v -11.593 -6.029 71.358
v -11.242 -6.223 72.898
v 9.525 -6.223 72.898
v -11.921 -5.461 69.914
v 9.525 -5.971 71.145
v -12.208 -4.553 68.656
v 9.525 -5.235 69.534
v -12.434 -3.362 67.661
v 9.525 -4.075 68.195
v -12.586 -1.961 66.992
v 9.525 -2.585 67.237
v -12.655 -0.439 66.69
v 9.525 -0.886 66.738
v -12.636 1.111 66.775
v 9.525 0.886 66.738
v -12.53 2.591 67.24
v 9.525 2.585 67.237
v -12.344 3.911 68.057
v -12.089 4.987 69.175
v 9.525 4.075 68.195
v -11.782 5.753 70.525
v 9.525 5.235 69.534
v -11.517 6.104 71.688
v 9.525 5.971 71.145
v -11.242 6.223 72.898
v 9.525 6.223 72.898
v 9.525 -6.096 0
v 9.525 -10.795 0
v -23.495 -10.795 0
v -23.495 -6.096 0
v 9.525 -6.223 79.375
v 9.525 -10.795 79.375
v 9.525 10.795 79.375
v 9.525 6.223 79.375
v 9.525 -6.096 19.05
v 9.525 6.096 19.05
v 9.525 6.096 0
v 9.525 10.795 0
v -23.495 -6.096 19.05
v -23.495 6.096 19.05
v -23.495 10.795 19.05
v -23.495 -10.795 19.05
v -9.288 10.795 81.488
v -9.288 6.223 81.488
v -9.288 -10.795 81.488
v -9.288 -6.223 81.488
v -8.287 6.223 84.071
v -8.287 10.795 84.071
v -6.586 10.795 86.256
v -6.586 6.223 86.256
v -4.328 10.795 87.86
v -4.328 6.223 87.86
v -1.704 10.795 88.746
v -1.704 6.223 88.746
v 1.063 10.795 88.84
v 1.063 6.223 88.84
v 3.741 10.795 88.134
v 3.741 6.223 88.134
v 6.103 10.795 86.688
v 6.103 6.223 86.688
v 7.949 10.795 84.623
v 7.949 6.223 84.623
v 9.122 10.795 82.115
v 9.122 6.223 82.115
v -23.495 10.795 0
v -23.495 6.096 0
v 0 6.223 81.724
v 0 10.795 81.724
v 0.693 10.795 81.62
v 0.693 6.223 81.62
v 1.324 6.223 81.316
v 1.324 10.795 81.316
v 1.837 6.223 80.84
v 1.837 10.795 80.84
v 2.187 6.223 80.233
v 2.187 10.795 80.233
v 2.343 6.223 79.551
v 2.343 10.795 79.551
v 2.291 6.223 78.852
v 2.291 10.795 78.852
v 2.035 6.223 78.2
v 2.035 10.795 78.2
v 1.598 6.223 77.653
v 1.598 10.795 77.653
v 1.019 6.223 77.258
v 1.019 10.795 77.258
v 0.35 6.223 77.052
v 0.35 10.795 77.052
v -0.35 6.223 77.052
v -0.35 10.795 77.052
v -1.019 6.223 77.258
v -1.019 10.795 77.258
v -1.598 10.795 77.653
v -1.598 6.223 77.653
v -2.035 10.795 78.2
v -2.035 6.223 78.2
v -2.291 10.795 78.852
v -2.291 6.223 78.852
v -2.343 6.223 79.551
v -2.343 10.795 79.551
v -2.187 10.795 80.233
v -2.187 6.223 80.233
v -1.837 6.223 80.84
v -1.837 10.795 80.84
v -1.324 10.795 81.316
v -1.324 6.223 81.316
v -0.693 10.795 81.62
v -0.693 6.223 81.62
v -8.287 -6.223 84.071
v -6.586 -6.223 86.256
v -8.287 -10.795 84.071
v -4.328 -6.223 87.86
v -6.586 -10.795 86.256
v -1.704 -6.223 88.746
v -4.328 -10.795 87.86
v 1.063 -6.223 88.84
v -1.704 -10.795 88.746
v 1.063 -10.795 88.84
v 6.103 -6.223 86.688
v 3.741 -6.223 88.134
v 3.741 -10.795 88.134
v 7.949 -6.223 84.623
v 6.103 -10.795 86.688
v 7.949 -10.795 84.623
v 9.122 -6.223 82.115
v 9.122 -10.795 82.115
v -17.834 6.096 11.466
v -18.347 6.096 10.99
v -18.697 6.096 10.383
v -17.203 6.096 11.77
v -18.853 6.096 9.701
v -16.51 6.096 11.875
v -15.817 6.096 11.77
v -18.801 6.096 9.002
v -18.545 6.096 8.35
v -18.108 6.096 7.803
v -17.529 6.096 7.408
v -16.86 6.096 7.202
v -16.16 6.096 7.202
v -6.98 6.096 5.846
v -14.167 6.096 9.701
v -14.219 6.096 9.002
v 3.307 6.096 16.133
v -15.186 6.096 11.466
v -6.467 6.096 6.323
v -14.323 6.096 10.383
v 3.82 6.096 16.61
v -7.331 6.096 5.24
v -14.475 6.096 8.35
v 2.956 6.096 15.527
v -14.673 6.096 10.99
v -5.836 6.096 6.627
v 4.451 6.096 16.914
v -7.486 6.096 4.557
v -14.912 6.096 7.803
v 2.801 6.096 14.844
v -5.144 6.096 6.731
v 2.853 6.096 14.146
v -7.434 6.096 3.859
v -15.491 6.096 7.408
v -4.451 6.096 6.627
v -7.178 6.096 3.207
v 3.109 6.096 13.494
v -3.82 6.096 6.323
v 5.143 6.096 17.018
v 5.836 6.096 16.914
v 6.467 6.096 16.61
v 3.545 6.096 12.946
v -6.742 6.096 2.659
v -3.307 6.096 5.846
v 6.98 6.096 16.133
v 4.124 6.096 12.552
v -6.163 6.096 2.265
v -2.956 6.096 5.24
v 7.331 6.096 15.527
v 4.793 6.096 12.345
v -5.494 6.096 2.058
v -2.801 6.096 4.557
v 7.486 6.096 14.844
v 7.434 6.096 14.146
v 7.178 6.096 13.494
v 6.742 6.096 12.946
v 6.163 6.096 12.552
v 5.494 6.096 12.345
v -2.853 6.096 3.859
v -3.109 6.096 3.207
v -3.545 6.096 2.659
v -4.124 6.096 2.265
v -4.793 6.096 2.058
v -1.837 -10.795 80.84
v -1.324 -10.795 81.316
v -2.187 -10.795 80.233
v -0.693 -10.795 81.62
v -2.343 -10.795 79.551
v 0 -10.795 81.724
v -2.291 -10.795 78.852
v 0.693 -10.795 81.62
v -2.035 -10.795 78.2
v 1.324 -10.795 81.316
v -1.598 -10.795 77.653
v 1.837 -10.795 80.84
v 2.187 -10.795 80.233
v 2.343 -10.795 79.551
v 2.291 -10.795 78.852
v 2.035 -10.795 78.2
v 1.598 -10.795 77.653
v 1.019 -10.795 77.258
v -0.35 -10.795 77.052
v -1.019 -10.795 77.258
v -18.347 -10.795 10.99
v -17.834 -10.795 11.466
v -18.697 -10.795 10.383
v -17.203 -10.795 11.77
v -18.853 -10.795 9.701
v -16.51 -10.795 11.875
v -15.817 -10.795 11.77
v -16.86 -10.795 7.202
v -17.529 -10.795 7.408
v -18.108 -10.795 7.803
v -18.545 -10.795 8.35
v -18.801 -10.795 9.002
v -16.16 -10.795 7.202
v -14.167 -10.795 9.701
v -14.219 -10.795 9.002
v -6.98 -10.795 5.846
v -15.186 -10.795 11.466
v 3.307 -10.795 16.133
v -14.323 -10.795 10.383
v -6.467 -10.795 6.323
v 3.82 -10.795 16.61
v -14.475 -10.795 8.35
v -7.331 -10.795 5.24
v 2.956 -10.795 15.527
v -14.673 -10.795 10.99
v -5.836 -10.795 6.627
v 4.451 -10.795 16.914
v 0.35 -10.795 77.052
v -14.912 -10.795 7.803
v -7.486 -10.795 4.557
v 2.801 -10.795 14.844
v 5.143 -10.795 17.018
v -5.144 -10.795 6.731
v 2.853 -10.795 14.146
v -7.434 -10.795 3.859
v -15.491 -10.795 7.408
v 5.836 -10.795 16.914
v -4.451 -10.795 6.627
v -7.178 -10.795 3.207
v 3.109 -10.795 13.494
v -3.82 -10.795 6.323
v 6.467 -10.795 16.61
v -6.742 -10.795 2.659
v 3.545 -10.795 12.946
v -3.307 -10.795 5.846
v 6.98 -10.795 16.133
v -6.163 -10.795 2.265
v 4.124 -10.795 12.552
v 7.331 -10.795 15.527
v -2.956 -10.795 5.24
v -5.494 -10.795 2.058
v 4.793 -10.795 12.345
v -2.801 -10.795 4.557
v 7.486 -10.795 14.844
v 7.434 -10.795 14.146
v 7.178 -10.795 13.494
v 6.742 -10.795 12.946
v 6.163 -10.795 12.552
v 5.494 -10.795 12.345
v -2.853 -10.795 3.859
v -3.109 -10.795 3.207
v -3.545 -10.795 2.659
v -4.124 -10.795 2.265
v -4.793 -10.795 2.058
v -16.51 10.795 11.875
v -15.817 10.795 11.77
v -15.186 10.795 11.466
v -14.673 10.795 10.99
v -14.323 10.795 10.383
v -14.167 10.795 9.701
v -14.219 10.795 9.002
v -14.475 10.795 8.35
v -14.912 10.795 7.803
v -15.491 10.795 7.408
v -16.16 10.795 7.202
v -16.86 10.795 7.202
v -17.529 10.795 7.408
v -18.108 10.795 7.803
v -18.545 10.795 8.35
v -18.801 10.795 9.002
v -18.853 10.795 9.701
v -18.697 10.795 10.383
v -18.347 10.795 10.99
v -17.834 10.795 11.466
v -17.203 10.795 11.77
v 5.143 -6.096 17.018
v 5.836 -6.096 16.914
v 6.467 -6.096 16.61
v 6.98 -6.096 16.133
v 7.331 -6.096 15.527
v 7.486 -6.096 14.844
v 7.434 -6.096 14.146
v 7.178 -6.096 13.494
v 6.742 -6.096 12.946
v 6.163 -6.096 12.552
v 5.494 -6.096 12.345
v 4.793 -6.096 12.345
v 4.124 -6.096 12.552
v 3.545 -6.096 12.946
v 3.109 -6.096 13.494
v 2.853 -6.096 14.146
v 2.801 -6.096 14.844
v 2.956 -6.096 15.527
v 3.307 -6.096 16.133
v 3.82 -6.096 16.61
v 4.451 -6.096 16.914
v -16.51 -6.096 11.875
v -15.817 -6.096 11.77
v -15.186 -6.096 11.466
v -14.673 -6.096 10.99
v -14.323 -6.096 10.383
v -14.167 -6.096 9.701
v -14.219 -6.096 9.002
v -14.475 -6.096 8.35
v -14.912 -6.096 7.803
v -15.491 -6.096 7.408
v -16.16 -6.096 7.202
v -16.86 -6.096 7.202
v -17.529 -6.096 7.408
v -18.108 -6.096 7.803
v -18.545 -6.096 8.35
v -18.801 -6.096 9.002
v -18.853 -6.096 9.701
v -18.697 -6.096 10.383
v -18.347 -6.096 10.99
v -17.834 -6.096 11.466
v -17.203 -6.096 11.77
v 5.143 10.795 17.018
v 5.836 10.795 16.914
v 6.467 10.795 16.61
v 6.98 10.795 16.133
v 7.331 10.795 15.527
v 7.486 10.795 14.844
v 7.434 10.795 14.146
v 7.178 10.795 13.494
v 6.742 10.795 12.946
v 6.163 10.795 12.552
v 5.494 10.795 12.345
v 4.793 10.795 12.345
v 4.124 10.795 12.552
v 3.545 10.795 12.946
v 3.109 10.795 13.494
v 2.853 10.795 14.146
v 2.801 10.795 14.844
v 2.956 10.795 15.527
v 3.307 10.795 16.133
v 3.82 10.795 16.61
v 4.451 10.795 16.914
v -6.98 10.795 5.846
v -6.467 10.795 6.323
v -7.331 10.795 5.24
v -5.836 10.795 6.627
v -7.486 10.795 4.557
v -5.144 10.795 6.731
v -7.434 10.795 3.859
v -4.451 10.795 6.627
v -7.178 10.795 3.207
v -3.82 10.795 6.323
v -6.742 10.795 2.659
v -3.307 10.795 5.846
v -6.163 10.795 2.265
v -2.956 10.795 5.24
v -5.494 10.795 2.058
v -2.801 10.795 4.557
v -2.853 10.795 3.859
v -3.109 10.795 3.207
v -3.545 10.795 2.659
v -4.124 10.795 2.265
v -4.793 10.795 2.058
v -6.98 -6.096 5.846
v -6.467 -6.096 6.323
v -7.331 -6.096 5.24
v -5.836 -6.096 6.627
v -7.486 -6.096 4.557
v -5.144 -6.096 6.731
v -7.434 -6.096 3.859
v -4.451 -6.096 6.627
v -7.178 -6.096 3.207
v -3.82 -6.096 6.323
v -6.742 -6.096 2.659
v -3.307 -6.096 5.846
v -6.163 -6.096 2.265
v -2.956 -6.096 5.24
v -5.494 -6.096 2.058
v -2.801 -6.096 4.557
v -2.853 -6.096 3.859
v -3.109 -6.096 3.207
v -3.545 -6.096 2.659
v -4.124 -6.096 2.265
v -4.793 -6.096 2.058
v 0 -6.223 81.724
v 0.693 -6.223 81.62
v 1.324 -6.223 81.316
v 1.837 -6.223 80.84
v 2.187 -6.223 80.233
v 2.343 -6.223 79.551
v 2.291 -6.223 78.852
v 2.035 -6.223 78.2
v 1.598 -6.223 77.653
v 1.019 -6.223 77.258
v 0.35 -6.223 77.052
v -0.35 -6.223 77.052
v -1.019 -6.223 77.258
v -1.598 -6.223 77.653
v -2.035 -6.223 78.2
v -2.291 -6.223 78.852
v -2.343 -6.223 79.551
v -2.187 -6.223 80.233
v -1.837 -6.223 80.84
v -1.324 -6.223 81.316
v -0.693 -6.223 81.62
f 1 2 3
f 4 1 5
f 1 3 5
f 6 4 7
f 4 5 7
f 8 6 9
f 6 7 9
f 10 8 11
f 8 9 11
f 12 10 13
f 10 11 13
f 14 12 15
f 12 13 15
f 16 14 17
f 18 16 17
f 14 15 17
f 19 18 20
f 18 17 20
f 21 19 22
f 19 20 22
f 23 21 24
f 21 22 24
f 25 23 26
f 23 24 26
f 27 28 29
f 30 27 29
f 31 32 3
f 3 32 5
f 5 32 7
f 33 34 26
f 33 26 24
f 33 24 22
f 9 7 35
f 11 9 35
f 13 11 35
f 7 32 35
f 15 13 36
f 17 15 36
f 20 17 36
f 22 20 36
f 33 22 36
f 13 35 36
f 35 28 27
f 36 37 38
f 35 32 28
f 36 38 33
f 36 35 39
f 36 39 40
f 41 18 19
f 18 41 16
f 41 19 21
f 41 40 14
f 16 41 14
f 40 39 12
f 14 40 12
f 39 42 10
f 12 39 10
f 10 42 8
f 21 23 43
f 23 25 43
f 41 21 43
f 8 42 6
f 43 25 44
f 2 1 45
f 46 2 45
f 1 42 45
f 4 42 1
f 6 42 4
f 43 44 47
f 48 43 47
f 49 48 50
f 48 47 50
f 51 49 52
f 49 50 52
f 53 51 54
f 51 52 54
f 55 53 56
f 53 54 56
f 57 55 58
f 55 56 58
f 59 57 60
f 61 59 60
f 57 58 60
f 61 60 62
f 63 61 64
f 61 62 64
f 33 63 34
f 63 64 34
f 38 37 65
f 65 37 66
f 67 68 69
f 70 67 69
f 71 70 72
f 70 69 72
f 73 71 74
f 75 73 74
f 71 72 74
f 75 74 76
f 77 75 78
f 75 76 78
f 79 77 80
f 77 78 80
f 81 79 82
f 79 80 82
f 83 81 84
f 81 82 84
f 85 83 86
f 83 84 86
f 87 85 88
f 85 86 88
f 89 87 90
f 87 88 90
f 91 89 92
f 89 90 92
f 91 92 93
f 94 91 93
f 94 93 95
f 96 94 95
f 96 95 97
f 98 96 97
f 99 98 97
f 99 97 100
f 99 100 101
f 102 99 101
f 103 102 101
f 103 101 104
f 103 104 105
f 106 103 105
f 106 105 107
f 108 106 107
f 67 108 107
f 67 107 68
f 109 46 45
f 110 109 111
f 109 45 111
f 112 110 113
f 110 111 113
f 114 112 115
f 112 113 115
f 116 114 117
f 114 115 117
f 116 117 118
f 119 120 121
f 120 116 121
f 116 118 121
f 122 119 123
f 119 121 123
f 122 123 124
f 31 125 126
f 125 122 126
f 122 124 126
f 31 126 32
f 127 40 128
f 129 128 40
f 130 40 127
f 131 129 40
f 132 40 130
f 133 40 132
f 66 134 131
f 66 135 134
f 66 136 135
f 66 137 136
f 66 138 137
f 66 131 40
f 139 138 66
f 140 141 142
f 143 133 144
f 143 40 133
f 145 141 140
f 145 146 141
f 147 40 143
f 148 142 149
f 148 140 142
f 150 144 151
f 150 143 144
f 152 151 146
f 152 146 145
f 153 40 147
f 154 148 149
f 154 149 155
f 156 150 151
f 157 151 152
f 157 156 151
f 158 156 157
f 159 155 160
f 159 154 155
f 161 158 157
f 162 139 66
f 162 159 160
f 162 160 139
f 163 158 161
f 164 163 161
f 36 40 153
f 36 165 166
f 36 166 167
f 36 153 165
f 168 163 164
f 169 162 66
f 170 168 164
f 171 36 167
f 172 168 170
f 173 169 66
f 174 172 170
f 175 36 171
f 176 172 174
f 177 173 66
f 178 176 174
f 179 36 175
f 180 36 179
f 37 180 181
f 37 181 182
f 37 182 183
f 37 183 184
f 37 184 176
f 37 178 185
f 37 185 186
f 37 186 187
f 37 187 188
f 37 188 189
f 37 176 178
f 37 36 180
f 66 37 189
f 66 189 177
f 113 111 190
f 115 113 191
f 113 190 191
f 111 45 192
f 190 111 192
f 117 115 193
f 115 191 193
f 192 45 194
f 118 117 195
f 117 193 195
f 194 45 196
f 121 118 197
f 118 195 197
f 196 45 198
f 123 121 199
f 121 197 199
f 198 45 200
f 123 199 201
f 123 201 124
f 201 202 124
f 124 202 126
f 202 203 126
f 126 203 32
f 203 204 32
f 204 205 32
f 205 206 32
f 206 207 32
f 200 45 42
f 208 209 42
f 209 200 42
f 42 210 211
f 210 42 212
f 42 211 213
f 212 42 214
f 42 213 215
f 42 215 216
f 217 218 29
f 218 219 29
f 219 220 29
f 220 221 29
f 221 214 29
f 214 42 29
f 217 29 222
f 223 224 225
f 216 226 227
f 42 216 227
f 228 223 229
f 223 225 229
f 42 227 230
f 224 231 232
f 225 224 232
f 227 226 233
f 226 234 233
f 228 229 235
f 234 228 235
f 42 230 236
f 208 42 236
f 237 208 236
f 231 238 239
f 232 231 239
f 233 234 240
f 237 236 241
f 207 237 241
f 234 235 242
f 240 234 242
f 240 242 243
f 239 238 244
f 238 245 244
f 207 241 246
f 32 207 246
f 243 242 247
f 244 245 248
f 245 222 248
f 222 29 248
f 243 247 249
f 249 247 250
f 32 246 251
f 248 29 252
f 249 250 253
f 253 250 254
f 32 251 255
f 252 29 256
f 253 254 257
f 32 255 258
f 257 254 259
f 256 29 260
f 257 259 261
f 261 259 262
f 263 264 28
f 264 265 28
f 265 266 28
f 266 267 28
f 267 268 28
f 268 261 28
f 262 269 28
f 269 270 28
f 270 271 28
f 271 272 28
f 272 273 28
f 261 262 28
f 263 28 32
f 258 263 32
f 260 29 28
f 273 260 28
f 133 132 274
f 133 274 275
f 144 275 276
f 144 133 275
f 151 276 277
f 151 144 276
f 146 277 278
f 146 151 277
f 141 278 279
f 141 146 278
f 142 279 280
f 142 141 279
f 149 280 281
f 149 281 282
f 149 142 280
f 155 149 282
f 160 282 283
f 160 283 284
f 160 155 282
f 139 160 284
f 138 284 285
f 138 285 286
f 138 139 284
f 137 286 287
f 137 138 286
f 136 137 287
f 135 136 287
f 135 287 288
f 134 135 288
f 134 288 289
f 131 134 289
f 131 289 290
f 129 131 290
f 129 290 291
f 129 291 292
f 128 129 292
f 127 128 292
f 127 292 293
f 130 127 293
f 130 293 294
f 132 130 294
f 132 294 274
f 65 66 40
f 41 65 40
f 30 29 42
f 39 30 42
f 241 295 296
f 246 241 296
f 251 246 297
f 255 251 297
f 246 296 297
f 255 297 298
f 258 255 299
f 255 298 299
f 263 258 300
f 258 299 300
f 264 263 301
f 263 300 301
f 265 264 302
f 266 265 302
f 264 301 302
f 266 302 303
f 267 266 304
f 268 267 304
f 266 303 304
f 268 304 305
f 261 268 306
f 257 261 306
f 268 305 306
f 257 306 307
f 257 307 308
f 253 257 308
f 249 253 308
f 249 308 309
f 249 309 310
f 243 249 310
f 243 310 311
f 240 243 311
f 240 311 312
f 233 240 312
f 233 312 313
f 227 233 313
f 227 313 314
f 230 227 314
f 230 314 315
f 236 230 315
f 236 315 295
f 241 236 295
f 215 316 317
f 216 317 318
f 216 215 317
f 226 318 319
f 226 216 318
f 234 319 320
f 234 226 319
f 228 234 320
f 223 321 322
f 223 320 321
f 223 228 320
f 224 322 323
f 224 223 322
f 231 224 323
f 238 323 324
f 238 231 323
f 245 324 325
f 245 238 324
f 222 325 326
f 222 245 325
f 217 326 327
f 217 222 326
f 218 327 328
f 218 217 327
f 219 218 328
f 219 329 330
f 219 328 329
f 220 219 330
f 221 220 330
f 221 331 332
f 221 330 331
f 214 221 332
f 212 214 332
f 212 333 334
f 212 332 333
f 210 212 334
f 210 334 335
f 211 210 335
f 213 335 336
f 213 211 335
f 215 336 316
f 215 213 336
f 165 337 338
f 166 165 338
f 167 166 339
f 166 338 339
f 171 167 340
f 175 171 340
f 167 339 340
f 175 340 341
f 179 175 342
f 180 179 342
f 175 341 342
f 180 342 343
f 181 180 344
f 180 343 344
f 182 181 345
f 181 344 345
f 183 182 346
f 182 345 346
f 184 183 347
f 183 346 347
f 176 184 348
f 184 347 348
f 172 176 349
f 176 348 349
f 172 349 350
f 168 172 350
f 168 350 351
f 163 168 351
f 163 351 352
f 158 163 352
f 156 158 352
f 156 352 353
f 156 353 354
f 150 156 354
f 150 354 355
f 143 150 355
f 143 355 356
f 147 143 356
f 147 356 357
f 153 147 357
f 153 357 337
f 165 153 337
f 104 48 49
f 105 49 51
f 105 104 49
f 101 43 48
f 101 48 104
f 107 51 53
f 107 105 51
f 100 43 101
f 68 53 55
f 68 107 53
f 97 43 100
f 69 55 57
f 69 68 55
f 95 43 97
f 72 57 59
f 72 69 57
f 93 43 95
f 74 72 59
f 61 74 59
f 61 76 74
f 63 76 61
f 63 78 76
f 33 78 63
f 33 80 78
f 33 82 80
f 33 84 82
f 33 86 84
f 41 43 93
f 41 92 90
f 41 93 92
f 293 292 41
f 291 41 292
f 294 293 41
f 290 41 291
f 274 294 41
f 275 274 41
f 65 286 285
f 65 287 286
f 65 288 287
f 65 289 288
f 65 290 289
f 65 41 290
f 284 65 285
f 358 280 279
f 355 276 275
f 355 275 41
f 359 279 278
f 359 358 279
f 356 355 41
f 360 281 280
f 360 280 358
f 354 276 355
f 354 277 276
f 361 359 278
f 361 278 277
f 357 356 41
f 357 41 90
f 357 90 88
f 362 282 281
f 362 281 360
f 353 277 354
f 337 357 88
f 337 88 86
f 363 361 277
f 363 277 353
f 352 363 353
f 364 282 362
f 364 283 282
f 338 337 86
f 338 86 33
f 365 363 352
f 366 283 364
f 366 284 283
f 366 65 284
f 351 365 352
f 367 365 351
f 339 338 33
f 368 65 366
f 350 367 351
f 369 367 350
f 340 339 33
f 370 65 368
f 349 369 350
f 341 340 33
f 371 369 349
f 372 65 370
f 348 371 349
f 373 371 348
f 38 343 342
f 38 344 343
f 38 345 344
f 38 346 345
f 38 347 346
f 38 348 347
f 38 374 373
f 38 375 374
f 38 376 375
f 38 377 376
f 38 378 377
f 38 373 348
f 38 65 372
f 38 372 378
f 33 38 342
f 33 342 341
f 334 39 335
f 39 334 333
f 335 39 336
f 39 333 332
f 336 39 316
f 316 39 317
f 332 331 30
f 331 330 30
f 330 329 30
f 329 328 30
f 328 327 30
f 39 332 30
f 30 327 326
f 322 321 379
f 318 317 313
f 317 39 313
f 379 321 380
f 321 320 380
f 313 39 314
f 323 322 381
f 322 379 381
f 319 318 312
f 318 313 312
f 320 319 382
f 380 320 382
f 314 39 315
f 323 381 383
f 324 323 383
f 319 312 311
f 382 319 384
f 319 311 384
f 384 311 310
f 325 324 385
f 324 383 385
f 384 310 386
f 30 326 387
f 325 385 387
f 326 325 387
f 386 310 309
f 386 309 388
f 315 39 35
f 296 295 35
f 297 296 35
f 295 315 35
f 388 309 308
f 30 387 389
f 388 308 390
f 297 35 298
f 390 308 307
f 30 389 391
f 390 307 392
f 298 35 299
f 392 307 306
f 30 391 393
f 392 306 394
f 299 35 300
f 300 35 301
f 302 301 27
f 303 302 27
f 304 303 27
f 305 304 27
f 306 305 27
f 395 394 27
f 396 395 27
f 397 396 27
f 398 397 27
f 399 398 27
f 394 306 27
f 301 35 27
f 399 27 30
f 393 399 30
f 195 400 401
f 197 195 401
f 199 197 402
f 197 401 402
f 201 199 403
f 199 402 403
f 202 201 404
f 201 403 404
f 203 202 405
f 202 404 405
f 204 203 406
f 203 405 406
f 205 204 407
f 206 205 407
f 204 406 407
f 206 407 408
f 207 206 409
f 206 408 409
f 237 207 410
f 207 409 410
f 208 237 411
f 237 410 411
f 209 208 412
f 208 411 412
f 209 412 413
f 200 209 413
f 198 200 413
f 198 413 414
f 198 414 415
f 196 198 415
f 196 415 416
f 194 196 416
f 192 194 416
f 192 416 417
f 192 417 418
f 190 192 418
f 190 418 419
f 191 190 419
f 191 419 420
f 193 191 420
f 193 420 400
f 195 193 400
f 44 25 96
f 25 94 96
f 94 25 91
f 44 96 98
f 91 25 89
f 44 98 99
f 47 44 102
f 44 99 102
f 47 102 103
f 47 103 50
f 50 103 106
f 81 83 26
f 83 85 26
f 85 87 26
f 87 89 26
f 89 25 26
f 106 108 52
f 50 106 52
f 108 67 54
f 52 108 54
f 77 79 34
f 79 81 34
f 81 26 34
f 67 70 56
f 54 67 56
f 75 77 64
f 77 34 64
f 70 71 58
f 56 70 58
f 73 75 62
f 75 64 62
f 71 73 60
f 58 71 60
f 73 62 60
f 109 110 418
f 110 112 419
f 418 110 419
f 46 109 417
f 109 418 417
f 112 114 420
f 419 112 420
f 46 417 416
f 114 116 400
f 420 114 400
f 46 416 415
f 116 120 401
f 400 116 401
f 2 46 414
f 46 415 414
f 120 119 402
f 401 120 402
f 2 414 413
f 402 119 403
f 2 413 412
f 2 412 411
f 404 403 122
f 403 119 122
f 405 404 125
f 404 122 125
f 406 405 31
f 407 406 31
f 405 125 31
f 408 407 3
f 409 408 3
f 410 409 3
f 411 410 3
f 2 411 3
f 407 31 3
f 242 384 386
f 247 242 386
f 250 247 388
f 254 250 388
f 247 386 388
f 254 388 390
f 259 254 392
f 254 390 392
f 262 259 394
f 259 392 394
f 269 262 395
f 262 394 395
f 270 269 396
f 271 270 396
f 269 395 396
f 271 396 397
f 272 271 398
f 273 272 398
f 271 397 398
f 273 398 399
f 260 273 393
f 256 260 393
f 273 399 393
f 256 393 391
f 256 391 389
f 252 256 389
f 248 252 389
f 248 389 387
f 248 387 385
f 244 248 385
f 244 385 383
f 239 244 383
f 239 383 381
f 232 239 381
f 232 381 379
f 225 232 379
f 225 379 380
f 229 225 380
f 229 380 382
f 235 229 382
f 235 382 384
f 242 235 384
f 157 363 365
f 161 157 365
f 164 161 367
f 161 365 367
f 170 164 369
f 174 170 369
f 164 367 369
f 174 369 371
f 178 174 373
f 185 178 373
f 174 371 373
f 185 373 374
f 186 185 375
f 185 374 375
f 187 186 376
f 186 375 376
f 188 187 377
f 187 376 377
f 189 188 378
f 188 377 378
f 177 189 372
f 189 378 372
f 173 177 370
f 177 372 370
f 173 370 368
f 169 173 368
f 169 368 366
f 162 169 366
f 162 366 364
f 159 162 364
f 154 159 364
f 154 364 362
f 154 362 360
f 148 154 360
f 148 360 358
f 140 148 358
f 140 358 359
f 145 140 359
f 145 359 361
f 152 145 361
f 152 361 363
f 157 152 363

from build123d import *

# Parameters (mm, degrees)
SKETCH1_W                    = 19.05
SKETCH1_H                    = 21.59
BOSS_EXTRUDE1_DEPTH          = 88.9
CUT_EXTRUDE_THIN1_DEPTH      = 92.978604713
CUT_EXTRUDE_THIN1_DEPTH_BACK = 88.9
SKETCH4_R                    = 2.3495
CUT_EXTRUDE1_DEPTH           = 92.978604713
BOSS_EXTRUDE2_START          = -21.59
SKETCH5_R                    = 2.3495
BOSS_EXTRUDE2_DEPTH          = 21.59
SKETCH6_W                    = 38.1
SKETCH6_H                    = 12.192
CUT_EXTRUDE2_DEPTH           = 96.446647008


with BuildPart() as part:
    # Sketch1 → Boss-Extrude1 (new body)
    with BuildSketch(Plane.XY):
        Rectangle(SKETCH1_W, SKETCH1_H)
    extrude(amount=BOSS_EXTRUDE1_DEPTH)

    # Sketch3 → Cut-Extrude-Thin1 (cut, two sides: drawn at the far end of the back side and taken through both)
    with BuildSketch(Plane(origin=(0, 10.795, 0), x_dir=(1, 0, 0), z_dir=(0, 1, 0)).offset(-CUT_EXTRUDE_THIN1_DEPTH_BACK)):
        with BuildLine():
            ThreePointArc((-9.525, -79.375), (0, -88.9), (9.525, -79.375))
            Line((9.525, -79.375), (34.925, -79.375))
            ThreePointArc((34.925, -79.375), (0, -114.3), (-34.925, -79.375))
            Line((-34.925, -79.375), (-9.525, -79.375))
        make_face()
    extrude(amount=CUT_EXTRUDE_THIN1_DEPTH + CUT_EXTRUDE_THIN1_DEPTH_BACK, mode=Mode.SUBTRACT)

    # Sketch4 → Cut-Extrude1 (cut, through all)
    with BuildSketch(Plane(origin=(0, 10.795, 0), x_dir=(1, 0, 0), z_dir=(0, 1, 0))):
        with Locations(Location((0, -79.375, 0), (0, 0, 270))):
            Circle(SKETCH4_R)
        with Locations(Location((5.1435, -14.6685, 0), (0, 0, 270))):
            Circle(SKETCH4_R)
        with Locations(Location((-5.1435, -4.3815, 0), (0, 0, 270))):
            Circle(SKETCH4_R)
    extrude(amount=-CUT_EXTRUDE1_DEPTH, mode=Mode.SUBTRACT)

    # Sketch5 → Boss-Extrude2 (add)
    with BuildSketch(Plane(origin=(0, 10.795, 0), x_dir=(1, 0, 0), z_dir=(0, 1, 0)).offset(BOSS_EXTRUDE2_START)):
        with BuildLine():
            Line((-9.525, -79.375), (-9.525, 0))
            Line((-9.525, 0), (-23.495, 0))
            Line((-23.495, 0), (-23.495, -19.05))
            Line((-23.495, -19.05), (-9.287597736, -81.488327539))
            ThreePointArc((-9.287597736, -81.488327539), (-9.465463365, -80.438310059), (-9.525, -79.375))
        make_face()
        with Locations(Location((-16.51, -9.525, 0), (0, 0, 270))):
            Circle(SKETCH5_R, mode=Mode.SUBTRACT)
    extrude(amount=BOSS_EXTRUDE2_DEPTH)

    # Sketch6 → Cut-Extrude2 (cut, through all)
    with BuildSketch(Plane(origin=(9.525, 0, 0), x_dir=(0, 0, -1), z_dir=(1, 0, 0))):
        Rectangle(SKETCH6_W, SKETCH6_H)
        with BuildLine():
            Line((-92.075, -6.223), (-72.898, -6.223))
            ThreePointArc((-72.898, -6.223), (-66.675, 0), (-72.898, 6.223))
            Line((-72.898, 6.223), (-92.075, 6.223))
            Line((-92.075, 6.223), (-92.075, -6.223))
        make_face()
    extrude(amount=-CUT_EXTRUDE2_DEPTH, mode=Mode.SUBTRACT)


solid = part.part
